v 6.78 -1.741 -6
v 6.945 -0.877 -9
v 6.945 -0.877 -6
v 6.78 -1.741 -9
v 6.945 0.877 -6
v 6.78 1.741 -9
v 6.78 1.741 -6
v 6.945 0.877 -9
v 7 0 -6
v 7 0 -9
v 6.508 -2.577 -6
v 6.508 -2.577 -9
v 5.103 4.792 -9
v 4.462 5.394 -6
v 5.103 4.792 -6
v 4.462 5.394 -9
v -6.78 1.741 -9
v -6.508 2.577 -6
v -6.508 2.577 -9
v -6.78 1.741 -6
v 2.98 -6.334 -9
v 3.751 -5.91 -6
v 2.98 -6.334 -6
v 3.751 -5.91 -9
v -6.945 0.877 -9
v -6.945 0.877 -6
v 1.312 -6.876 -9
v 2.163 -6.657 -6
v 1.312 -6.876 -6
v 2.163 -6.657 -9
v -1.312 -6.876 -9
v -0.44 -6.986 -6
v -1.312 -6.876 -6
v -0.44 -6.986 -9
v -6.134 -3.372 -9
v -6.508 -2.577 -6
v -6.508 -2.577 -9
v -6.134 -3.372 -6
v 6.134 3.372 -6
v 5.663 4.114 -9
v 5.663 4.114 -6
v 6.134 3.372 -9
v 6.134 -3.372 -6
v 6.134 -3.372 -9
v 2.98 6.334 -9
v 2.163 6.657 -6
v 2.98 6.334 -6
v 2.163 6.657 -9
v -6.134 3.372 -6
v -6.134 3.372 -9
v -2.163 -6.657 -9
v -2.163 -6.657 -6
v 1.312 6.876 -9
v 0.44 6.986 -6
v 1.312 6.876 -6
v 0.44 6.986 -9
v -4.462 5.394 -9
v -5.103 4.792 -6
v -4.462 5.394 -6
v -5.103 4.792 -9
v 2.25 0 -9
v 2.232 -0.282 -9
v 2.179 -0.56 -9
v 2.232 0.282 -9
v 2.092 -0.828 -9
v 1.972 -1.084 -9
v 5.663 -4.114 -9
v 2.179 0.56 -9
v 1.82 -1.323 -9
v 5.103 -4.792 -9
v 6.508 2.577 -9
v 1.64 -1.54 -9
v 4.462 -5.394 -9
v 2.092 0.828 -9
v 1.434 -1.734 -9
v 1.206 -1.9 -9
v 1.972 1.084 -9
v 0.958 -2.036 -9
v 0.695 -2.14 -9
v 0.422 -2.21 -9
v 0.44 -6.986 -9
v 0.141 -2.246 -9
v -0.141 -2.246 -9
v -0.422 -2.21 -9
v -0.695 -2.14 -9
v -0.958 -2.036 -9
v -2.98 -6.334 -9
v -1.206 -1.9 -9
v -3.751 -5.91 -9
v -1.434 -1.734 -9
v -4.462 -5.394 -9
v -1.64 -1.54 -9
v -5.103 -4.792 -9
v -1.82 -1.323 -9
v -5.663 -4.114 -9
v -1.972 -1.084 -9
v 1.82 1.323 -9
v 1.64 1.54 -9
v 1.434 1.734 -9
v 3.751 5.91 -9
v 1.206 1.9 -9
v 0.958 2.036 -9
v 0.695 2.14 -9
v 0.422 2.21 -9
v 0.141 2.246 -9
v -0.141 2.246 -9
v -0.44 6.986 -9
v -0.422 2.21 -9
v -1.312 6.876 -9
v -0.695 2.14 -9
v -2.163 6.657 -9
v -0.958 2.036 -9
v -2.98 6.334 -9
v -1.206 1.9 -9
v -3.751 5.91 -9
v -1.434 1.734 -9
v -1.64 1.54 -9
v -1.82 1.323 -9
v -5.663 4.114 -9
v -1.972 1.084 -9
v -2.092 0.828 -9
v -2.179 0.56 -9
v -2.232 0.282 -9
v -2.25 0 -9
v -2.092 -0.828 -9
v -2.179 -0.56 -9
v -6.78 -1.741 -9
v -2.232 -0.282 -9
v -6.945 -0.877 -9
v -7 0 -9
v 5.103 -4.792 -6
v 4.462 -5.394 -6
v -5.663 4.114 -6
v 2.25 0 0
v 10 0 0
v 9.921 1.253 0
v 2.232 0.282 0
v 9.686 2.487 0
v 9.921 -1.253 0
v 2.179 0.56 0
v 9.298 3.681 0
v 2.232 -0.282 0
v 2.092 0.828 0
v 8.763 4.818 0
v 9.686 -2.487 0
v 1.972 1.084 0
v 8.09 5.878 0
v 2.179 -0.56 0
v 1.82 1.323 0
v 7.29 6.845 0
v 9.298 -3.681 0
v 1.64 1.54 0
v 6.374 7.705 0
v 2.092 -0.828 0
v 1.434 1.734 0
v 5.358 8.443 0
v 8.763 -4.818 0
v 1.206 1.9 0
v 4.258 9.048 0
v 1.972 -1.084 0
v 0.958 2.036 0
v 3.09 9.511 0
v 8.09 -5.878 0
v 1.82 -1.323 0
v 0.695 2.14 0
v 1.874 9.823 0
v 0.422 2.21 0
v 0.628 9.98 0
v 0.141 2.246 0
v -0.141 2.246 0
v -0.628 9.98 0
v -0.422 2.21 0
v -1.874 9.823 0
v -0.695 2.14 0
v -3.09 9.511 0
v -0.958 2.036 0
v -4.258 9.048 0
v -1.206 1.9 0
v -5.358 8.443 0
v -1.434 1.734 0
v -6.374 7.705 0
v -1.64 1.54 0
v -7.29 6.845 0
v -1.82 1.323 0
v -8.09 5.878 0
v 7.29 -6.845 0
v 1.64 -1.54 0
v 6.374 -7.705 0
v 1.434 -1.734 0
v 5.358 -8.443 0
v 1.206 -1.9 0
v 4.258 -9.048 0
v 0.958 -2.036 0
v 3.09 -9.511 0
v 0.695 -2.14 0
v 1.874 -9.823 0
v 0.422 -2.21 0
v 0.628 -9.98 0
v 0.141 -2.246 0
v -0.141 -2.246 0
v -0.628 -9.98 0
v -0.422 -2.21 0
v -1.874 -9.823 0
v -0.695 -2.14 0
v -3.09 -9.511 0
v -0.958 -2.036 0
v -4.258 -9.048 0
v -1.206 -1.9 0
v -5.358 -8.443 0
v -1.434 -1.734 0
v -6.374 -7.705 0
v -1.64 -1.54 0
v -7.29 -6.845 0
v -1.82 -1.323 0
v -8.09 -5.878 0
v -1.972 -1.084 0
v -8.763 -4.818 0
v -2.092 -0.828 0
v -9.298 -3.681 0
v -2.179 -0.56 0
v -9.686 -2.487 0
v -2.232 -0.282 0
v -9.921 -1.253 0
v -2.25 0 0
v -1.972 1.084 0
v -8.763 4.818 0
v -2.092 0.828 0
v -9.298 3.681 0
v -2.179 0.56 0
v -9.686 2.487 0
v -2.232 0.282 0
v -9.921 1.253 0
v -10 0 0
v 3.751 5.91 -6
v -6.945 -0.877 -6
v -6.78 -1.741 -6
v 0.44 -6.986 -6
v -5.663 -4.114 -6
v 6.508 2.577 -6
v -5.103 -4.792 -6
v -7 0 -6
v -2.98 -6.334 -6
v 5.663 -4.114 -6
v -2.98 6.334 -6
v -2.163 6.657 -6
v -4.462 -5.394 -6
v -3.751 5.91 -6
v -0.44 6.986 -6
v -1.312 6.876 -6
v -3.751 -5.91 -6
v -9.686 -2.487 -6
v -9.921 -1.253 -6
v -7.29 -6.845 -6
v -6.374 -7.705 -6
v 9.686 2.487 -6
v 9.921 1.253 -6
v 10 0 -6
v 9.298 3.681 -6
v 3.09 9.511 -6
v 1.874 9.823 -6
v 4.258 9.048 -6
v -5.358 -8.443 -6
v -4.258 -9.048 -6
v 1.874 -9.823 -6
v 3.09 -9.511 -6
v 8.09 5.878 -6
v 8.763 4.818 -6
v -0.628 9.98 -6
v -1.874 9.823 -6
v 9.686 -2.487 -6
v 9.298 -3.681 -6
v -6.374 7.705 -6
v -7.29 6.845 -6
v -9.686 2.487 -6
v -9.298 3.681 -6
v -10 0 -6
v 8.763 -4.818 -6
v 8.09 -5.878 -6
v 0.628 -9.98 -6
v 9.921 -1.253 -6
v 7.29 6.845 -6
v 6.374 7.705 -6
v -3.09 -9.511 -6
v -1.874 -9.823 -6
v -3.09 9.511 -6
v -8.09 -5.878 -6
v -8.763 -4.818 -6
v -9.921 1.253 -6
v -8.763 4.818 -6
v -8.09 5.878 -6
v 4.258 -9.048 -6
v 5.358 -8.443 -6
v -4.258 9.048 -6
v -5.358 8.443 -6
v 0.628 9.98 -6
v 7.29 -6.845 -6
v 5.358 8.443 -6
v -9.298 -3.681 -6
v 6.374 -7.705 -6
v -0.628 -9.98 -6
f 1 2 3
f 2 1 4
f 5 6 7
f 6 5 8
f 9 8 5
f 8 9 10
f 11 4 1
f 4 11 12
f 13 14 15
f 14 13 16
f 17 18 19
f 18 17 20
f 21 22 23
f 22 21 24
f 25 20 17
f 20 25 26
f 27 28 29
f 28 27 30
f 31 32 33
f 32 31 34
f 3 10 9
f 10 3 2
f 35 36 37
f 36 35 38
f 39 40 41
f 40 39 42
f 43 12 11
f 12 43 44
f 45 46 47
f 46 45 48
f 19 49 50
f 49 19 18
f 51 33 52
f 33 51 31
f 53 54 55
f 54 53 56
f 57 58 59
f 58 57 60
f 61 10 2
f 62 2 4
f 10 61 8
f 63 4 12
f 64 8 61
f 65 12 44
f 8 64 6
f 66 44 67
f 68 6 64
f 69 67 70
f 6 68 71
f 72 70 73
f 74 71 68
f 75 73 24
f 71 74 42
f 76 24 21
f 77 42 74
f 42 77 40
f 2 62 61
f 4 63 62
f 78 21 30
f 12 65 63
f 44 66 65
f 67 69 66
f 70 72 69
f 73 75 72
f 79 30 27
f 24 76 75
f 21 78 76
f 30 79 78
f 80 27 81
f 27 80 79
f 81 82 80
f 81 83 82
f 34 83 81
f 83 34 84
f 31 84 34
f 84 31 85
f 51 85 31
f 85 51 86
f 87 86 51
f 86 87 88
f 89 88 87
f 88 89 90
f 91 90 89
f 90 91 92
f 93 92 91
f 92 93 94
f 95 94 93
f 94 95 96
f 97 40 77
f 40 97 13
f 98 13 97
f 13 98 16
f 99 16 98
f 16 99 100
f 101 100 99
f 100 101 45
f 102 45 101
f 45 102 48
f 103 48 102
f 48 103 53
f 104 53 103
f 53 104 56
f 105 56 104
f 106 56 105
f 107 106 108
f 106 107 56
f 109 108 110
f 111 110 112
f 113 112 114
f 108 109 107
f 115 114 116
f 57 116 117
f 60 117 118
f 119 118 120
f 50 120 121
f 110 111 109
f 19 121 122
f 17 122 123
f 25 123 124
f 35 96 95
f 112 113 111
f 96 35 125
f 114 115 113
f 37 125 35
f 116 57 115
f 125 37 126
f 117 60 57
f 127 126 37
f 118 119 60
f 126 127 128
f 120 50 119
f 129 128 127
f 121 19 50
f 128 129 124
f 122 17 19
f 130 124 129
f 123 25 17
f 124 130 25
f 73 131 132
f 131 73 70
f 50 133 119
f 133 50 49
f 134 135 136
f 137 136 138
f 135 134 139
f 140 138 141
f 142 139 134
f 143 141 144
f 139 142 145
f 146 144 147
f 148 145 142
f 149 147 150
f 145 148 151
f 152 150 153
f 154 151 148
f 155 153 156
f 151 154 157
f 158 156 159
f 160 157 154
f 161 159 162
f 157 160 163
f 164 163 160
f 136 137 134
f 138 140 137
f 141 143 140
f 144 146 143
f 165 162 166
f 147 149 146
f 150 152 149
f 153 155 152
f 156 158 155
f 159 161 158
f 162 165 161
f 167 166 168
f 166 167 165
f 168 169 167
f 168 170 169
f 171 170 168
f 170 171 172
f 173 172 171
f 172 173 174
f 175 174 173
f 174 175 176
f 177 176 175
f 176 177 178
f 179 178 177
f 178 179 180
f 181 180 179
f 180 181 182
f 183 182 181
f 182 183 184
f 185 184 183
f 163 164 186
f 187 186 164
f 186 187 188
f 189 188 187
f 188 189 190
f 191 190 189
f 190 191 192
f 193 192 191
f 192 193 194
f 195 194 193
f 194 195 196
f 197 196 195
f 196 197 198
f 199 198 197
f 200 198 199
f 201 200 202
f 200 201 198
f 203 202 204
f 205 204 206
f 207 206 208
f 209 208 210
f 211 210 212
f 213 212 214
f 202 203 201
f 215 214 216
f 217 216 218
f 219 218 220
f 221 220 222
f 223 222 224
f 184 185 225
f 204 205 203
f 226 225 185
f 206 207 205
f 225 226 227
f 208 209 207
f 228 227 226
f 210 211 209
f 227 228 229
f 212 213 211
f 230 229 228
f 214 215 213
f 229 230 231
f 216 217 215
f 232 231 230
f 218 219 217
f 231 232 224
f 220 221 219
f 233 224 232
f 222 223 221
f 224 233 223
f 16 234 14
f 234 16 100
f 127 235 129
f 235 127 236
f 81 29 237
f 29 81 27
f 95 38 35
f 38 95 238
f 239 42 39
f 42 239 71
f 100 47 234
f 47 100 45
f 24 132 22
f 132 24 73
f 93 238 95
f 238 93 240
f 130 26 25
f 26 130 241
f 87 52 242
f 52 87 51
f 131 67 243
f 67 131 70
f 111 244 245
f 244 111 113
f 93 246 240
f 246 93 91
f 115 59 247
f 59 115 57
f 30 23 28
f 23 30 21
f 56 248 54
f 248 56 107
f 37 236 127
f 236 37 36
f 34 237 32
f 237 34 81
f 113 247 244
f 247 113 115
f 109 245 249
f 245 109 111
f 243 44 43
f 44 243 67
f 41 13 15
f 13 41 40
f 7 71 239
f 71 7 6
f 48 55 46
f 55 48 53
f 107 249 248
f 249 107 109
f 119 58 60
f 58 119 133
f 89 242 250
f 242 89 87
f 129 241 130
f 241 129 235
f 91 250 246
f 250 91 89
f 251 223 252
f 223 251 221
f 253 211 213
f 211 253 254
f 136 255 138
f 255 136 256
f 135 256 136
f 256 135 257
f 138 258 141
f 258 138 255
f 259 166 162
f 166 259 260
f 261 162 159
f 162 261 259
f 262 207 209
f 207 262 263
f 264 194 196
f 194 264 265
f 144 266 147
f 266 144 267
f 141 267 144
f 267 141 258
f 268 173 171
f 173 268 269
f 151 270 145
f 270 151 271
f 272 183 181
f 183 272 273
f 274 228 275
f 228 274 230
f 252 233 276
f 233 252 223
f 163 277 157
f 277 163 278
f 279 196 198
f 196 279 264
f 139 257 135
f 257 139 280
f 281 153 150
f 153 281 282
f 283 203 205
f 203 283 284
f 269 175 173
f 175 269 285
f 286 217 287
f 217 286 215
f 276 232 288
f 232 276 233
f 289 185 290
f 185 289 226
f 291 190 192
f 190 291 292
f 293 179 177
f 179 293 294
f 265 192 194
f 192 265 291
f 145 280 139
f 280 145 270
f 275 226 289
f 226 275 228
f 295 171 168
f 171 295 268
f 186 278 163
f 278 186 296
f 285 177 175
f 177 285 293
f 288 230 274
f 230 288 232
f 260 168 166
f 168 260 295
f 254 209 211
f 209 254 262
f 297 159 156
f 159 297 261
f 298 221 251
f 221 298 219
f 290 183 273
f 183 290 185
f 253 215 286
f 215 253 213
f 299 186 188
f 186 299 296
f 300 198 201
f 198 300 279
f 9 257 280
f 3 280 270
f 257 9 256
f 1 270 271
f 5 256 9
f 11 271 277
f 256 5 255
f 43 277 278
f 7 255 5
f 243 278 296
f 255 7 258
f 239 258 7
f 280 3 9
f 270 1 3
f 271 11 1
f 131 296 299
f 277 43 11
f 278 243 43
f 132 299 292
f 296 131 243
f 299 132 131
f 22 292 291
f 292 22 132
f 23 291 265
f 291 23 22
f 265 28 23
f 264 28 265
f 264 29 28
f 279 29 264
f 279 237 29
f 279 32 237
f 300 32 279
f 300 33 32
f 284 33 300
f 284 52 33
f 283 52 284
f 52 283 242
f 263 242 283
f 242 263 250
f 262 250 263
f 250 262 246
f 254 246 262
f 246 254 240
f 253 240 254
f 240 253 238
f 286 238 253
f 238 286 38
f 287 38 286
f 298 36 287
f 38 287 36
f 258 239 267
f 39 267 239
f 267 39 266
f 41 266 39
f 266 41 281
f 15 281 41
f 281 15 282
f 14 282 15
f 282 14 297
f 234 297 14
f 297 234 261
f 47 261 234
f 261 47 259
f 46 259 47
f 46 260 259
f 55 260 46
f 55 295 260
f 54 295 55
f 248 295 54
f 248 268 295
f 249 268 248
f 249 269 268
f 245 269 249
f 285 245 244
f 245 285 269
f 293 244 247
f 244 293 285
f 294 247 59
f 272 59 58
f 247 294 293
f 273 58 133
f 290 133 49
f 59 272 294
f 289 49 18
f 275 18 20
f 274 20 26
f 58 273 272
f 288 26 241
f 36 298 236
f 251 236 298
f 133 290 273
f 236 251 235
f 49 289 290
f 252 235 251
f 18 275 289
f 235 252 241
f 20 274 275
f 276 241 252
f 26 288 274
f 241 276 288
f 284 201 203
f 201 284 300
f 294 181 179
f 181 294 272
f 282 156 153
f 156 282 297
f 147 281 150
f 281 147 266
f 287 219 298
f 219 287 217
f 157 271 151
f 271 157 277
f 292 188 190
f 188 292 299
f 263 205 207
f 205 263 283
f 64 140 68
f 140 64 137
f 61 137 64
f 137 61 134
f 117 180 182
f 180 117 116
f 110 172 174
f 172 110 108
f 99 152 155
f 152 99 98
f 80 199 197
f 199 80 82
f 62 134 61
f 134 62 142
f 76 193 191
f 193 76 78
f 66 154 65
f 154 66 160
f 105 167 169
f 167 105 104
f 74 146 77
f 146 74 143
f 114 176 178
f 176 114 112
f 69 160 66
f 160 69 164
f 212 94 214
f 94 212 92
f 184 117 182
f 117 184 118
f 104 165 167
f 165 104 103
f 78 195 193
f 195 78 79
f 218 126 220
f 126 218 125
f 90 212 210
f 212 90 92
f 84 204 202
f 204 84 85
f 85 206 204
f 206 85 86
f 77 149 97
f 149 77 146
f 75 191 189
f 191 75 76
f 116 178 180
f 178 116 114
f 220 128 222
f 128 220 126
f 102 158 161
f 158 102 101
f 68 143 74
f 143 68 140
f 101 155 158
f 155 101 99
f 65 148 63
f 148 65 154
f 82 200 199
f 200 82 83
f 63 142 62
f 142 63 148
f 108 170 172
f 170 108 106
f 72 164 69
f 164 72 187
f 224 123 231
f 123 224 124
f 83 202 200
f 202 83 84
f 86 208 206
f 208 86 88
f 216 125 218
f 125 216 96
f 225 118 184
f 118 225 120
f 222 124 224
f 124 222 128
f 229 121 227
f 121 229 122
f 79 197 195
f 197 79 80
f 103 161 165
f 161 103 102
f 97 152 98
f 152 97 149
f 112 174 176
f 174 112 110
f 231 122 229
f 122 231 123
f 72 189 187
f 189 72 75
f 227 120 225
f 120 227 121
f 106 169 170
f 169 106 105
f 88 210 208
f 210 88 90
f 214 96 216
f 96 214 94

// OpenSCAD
$fn = 50;


difference() {
	union() {
		translate(v = [0, 0, -9.0000000000]) {
			cylinder(h = 9, r = 7.0000000000);
		}
		translate(v = [0, 0, -6.0000000000]) {
			cylinder(h = 6, r = 10.0000000000);
		}
	}
	union() {
		#translate(v = [0, 0, -9]) {
			cylinder(h = 9, r = 2.2500000000);
		}
	}
}
